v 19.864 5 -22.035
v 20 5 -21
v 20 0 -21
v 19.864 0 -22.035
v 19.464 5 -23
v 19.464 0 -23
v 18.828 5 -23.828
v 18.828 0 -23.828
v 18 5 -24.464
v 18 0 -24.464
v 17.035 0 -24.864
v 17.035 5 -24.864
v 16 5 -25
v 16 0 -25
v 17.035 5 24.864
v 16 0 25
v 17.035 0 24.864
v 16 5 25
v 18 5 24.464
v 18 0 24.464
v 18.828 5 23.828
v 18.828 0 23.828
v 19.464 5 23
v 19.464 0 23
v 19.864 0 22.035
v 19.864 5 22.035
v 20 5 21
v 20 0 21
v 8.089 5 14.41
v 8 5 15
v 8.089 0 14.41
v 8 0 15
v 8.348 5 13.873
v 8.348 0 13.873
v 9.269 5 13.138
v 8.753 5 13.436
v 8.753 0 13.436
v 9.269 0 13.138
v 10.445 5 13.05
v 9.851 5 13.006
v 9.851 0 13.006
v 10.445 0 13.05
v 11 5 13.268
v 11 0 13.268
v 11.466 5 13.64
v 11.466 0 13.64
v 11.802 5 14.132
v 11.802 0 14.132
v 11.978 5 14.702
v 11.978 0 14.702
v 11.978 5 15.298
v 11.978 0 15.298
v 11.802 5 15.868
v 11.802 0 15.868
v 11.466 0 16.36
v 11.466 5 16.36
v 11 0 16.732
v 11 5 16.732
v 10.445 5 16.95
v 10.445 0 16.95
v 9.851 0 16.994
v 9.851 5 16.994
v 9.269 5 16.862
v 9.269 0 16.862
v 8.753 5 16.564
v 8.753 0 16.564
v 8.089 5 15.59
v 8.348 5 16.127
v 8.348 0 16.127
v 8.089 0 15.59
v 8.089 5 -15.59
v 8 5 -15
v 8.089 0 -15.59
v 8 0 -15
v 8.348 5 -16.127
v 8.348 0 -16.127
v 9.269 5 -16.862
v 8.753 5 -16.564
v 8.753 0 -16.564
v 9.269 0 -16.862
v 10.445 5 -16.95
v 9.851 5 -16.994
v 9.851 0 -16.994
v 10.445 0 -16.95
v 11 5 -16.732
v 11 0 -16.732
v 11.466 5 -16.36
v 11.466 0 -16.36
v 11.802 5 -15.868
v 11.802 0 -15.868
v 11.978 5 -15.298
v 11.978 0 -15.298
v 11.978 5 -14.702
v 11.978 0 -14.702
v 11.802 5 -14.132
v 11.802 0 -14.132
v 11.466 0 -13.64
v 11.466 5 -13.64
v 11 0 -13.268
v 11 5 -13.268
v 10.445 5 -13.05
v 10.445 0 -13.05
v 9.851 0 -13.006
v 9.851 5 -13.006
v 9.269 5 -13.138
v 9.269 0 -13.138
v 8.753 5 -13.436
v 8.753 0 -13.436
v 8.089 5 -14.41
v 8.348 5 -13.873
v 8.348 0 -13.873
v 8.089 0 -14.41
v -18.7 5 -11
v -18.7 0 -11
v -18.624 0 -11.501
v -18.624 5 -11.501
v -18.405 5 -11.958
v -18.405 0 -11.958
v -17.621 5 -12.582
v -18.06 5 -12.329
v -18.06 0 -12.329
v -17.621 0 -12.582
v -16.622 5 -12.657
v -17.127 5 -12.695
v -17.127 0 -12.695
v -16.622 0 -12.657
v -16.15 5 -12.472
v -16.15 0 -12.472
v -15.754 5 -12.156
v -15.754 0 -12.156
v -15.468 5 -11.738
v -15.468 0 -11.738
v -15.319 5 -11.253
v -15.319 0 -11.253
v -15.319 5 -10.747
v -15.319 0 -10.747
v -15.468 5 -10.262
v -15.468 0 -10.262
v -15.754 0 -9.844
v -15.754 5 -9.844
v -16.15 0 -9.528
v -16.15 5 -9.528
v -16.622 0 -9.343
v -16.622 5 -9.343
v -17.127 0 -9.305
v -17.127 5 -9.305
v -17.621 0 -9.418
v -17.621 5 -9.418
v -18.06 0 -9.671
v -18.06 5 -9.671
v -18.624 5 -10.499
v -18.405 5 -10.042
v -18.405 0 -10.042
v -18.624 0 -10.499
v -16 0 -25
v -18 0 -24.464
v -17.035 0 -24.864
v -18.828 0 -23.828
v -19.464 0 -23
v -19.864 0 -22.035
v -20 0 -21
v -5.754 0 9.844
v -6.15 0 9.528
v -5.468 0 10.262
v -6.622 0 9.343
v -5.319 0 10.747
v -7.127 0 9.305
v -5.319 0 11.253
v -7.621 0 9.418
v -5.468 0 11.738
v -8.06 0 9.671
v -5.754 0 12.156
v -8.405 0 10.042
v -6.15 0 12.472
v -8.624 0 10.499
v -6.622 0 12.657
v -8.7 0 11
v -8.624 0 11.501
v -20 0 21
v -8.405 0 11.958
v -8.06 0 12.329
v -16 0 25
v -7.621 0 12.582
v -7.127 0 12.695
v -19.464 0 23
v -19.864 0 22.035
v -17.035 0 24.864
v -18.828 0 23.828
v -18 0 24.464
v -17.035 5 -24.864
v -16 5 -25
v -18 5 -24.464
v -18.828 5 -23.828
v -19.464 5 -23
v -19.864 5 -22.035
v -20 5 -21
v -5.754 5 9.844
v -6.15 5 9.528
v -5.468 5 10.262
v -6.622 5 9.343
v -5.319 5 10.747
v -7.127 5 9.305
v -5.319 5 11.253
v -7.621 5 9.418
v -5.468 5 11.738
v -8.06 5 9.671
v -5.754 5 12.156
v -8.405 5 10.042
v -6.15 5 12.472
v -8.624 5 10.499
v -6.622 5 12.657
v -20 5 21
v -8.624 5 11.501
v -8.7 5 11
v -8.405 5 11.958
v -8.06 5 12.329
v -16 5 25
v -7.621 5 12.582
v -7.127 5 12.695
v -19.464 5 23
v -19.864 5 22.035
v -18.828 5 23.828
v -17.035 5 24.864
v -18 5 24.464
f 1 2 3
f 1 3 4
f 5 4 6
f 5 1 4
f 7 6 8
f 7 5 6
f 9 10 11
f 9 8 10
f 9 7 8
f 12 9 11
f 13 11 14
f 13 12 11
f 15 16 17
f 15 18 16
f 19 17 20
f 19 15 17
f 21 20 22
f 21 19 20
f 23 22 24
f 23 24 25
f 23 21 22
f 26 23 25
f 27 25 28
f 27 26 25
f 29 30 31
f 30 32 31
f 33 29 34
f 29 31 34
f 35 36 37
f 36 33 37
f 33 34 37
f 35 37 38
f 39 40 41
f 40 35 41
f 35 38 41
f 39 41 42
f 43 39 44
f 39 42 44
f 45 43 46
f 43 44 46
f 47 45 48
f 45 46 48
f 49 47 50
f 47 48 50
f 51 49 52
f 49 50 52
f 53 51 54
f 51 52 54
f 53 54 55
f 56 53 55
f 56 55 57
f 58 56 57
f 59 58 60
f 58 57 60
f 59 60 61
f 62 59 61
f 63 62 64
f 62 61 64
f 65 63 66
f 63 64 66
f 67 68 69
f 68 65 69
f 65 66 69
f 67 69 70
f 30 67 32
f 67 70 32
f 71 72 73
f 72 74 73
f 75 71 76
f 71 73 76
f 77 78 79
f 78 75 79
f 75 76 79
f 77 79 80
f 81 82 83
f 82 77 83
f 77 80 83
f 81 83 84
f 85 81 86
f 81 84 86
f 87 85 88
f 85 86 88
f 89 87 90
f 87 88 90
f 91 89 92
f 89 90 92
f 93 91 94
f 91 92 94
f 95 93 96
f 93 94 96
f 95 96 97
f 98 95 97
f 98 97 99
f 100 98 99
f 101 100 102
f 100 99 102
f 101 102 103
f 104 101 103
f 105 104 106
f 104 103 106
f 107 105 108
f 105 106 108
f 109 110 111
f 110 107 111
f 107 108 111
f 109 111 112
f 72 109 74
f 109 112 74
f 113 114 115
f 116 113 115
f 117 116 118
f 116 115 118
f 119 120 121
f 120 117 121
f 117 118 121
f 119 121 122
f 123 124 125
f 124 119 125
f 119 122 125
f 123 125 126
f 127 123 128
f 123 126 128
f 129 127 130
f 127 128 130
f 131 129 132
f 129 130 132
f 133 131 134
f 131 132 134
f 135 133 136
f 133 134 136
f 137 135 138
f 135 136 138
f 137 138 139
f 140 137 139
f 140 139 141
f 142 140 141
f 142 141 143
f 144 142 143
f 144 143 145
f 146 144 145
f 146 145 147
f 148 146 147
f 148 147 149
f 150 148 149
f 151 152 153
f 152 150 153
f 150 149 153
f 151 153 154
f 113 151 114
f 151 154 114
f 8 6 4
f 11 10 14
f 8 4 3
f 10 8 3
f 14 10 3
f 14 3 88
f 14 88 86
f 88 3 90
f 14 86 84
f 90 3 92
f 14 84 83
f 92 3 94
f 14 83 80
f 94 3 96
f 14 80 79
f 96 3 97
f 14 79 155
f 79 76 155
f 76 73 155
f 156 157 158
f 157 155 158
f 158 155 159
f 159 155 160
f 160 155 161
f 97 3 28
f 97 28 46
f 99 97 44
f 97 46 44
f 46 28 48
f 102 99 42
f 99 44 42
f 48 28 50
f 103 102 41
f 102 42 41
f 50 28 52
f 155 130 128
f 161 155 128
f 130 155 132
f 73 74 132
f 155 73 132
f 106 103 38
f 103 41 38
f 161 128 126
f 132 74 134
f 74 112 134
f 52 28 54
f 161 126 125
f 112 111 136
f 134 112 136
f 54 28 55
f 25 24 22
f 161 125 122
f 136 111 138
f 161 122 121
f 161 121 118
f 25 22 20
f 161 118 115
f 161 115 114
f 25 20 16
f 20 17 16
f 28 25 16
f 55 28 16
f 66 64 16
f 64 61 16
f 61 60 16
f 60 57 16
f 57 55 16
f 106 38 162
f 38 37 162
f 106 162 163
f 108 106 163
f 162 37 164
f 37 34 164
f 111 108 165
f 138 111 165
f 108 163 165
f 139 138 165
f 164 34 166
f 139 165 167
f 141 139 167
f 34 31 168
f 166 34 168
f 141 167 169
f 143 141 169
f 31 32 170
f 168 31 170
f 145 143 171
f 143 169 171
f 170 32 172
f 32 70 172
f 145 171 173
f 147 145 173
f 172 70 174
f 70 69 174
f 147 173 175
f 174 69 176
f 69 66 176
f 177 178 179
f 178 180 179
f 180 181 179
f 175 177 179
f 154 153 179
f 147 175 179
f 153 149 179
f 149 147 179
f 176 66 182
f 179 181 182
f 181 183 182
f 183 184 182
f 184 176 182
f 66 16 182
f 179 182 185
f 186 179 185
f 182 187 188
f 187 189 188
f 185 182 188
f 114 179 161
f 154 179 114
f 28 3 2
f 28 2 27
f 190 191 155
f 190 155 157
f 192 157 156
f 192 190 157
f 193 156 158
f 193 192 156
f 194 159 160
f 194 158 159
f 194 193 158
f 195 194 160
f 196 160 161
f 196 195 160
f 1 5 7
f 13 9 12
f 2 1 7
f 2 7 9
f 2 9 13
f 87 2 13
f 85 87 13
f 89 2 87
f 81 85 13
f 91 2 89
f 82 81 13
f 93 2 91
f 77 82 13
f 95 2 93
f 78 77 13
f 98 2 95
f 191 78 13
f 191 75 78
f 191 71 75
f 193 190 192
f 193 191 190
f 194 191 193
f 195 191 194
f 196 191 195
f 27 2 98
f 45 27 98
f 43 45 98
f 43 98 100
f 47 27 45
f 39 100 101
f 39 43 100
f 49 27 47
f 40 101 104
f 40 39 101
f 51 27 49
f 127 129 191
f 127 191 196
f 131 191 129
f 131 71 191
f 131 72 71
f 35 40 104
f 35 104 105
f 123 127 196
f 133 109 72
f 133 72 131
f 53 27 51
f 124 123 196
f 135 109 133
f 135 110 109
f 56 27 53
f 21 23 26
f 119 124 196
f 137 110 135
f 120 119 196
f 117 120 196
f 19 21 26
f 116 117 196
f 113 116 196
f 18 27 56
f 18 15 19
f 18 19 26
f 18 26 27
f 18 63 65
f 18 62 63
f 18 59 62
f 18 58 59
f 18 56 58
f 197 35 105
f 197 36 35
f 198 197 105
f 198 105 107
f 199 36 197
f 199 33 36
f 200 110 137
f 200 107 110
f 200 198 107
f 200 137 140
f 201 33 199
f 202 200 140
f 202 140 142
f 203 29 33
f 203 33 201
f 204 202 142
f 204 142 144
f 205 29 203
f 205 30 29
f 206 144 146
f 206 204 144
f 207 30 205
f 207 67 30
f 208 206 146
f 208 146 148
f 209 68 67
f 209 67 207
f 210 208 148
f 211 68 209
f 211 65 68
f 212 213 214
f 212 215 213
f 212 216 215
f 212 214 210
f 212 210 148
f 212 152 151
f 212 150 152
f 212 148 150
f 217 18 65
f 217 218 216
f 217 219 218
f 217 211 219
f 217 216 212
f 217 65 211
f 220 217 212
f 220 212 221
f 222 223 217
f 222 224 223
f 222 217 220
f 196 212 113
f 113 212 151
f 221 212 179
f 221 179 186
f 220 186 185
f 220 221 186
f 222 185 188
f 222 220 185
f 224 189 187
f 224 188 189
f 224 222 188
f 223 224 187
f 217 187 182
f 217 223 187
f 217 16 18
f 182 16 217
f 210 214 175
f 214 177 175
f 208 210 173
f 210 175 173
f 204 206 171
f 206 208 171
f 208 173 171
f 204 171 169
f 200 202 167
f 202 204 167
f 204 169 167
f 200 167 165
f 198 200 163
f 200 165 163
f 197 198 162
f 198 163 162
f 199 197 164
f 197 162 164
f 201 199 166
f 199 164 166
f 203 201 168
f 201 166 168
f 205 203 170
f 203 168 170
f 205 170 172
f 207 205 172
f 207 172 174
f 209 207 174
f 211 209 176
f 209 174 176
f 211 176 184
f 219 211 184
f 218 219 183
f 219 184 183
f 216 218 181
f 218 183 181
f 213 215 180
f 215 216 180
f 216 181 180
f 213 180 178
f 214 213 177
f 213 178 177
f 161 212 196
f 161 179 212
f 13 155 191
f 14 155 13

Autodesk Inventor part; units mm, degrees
ref_plane "YZ Plane" through (0, 0, 0) normal (1, 0, 0) x (0, 1, 0)
ref_plane "XZ Plane" through (0, 0, 0) normal (0, 1, 0) x (-1, 0, 0)
ref_plane "XY Plane" through (0, 0, 0) normal (0, 0, 1) x (1, 0, 0)
sketch "Sketch1" plane through (0, 0, 0) normal (0, 1, 0) x (-1, 0, 0)
  line L0 (-20, 25) -> (20, 25)
  line L1 (20, 25) -> (20, -25)
  line L2 (20, -25) -> (-20, -25)
  line L3 (-20, -25) -> (-20, 25)
  line L4 (-20, 25) -> (20, -25) construction
  line L5 (20, 25) -> (-20, -25) construction
  line L6 (17, 14) -> (7, 14) construction
  arc A0 (7, 14) -> (4, 11) centre (7, 11) ccw construction
  line L7 (4, 11) -> (4, -11) construction
  arc A1 (4, -11) -> (7, -14) centre (7, -11) ccw construction
  line L8 (7, -14) -> (17, -14) construction
  arc A2 (17, -14) -> (20, -11) centre (17, -11) ccw construction
  line L9 (20, -11) -> (20, 11) construction
  arc A3 (20, 11) -> (17, 14) centre (17, 11) ccw construction
  circle A4 centre (17.5, -0.5) radius 2 construction
  circle A5 centre (17, 11) radius 1.7 construction
  circle A6 centre (7, -11) radius 1.7 construction
  line L10 (4, 0) -> (20, 0) construction
  line L11 (17, -14) -> (7, -14) construction
  arc A7 (4, -11) -> (7, -14) centre (7, -11) ccw construction
  line L12 (4, -11) -> (4, 11) construction
  arc A8 (7, 14) -> (4, 11) centre (7, 11) ccw construction
  line L13 (7, 14) -> (17, 14) construction
  arc A9 (20, 11) -> (17, 14) centre (17, 11) ccw construction
  line L14 (20, 11) -> (20, -11) construction
  arc A10 (17, -14) -> (20, -11) centre (17, -11) ccw construction
  circle A11 centre (17.5, 0.5) radius 2 construction
  circle A12 centre (17, -11) radius 1.7
  circle A13 centre (7, 11) radius 1.7
  line L15 (20, 0) -> (-20, 0) construction
  line L16 (0, 25) -> (0, -25) construction
  line L17 (-10, 25) -> (-10, -25) construction
  circle A14 centre (-10, 15) radius 2
  circle A15 centre (-10, -15) radius 2
  point P0 (0, 0)
  point P1 (12, 0)
  dimension "d0" = 40
  dimension "d1" = 50
  dimension "d5" = 10
  dimension "d6" = 4
  dimension "d7" = 4
  dimension "d8" = 10
  dimension "d9" = 10
extrude "Extrusion2" add sketch "Sketch1" along normal blind 5
fillet "Fillet2" radius 4 4 edges at (20, 2.5, -25) (20, 2.5, 25) (-20, 2.5, -25) (-20, 2.5, 25)
properties part number "Soporte_Final_Carrera"
